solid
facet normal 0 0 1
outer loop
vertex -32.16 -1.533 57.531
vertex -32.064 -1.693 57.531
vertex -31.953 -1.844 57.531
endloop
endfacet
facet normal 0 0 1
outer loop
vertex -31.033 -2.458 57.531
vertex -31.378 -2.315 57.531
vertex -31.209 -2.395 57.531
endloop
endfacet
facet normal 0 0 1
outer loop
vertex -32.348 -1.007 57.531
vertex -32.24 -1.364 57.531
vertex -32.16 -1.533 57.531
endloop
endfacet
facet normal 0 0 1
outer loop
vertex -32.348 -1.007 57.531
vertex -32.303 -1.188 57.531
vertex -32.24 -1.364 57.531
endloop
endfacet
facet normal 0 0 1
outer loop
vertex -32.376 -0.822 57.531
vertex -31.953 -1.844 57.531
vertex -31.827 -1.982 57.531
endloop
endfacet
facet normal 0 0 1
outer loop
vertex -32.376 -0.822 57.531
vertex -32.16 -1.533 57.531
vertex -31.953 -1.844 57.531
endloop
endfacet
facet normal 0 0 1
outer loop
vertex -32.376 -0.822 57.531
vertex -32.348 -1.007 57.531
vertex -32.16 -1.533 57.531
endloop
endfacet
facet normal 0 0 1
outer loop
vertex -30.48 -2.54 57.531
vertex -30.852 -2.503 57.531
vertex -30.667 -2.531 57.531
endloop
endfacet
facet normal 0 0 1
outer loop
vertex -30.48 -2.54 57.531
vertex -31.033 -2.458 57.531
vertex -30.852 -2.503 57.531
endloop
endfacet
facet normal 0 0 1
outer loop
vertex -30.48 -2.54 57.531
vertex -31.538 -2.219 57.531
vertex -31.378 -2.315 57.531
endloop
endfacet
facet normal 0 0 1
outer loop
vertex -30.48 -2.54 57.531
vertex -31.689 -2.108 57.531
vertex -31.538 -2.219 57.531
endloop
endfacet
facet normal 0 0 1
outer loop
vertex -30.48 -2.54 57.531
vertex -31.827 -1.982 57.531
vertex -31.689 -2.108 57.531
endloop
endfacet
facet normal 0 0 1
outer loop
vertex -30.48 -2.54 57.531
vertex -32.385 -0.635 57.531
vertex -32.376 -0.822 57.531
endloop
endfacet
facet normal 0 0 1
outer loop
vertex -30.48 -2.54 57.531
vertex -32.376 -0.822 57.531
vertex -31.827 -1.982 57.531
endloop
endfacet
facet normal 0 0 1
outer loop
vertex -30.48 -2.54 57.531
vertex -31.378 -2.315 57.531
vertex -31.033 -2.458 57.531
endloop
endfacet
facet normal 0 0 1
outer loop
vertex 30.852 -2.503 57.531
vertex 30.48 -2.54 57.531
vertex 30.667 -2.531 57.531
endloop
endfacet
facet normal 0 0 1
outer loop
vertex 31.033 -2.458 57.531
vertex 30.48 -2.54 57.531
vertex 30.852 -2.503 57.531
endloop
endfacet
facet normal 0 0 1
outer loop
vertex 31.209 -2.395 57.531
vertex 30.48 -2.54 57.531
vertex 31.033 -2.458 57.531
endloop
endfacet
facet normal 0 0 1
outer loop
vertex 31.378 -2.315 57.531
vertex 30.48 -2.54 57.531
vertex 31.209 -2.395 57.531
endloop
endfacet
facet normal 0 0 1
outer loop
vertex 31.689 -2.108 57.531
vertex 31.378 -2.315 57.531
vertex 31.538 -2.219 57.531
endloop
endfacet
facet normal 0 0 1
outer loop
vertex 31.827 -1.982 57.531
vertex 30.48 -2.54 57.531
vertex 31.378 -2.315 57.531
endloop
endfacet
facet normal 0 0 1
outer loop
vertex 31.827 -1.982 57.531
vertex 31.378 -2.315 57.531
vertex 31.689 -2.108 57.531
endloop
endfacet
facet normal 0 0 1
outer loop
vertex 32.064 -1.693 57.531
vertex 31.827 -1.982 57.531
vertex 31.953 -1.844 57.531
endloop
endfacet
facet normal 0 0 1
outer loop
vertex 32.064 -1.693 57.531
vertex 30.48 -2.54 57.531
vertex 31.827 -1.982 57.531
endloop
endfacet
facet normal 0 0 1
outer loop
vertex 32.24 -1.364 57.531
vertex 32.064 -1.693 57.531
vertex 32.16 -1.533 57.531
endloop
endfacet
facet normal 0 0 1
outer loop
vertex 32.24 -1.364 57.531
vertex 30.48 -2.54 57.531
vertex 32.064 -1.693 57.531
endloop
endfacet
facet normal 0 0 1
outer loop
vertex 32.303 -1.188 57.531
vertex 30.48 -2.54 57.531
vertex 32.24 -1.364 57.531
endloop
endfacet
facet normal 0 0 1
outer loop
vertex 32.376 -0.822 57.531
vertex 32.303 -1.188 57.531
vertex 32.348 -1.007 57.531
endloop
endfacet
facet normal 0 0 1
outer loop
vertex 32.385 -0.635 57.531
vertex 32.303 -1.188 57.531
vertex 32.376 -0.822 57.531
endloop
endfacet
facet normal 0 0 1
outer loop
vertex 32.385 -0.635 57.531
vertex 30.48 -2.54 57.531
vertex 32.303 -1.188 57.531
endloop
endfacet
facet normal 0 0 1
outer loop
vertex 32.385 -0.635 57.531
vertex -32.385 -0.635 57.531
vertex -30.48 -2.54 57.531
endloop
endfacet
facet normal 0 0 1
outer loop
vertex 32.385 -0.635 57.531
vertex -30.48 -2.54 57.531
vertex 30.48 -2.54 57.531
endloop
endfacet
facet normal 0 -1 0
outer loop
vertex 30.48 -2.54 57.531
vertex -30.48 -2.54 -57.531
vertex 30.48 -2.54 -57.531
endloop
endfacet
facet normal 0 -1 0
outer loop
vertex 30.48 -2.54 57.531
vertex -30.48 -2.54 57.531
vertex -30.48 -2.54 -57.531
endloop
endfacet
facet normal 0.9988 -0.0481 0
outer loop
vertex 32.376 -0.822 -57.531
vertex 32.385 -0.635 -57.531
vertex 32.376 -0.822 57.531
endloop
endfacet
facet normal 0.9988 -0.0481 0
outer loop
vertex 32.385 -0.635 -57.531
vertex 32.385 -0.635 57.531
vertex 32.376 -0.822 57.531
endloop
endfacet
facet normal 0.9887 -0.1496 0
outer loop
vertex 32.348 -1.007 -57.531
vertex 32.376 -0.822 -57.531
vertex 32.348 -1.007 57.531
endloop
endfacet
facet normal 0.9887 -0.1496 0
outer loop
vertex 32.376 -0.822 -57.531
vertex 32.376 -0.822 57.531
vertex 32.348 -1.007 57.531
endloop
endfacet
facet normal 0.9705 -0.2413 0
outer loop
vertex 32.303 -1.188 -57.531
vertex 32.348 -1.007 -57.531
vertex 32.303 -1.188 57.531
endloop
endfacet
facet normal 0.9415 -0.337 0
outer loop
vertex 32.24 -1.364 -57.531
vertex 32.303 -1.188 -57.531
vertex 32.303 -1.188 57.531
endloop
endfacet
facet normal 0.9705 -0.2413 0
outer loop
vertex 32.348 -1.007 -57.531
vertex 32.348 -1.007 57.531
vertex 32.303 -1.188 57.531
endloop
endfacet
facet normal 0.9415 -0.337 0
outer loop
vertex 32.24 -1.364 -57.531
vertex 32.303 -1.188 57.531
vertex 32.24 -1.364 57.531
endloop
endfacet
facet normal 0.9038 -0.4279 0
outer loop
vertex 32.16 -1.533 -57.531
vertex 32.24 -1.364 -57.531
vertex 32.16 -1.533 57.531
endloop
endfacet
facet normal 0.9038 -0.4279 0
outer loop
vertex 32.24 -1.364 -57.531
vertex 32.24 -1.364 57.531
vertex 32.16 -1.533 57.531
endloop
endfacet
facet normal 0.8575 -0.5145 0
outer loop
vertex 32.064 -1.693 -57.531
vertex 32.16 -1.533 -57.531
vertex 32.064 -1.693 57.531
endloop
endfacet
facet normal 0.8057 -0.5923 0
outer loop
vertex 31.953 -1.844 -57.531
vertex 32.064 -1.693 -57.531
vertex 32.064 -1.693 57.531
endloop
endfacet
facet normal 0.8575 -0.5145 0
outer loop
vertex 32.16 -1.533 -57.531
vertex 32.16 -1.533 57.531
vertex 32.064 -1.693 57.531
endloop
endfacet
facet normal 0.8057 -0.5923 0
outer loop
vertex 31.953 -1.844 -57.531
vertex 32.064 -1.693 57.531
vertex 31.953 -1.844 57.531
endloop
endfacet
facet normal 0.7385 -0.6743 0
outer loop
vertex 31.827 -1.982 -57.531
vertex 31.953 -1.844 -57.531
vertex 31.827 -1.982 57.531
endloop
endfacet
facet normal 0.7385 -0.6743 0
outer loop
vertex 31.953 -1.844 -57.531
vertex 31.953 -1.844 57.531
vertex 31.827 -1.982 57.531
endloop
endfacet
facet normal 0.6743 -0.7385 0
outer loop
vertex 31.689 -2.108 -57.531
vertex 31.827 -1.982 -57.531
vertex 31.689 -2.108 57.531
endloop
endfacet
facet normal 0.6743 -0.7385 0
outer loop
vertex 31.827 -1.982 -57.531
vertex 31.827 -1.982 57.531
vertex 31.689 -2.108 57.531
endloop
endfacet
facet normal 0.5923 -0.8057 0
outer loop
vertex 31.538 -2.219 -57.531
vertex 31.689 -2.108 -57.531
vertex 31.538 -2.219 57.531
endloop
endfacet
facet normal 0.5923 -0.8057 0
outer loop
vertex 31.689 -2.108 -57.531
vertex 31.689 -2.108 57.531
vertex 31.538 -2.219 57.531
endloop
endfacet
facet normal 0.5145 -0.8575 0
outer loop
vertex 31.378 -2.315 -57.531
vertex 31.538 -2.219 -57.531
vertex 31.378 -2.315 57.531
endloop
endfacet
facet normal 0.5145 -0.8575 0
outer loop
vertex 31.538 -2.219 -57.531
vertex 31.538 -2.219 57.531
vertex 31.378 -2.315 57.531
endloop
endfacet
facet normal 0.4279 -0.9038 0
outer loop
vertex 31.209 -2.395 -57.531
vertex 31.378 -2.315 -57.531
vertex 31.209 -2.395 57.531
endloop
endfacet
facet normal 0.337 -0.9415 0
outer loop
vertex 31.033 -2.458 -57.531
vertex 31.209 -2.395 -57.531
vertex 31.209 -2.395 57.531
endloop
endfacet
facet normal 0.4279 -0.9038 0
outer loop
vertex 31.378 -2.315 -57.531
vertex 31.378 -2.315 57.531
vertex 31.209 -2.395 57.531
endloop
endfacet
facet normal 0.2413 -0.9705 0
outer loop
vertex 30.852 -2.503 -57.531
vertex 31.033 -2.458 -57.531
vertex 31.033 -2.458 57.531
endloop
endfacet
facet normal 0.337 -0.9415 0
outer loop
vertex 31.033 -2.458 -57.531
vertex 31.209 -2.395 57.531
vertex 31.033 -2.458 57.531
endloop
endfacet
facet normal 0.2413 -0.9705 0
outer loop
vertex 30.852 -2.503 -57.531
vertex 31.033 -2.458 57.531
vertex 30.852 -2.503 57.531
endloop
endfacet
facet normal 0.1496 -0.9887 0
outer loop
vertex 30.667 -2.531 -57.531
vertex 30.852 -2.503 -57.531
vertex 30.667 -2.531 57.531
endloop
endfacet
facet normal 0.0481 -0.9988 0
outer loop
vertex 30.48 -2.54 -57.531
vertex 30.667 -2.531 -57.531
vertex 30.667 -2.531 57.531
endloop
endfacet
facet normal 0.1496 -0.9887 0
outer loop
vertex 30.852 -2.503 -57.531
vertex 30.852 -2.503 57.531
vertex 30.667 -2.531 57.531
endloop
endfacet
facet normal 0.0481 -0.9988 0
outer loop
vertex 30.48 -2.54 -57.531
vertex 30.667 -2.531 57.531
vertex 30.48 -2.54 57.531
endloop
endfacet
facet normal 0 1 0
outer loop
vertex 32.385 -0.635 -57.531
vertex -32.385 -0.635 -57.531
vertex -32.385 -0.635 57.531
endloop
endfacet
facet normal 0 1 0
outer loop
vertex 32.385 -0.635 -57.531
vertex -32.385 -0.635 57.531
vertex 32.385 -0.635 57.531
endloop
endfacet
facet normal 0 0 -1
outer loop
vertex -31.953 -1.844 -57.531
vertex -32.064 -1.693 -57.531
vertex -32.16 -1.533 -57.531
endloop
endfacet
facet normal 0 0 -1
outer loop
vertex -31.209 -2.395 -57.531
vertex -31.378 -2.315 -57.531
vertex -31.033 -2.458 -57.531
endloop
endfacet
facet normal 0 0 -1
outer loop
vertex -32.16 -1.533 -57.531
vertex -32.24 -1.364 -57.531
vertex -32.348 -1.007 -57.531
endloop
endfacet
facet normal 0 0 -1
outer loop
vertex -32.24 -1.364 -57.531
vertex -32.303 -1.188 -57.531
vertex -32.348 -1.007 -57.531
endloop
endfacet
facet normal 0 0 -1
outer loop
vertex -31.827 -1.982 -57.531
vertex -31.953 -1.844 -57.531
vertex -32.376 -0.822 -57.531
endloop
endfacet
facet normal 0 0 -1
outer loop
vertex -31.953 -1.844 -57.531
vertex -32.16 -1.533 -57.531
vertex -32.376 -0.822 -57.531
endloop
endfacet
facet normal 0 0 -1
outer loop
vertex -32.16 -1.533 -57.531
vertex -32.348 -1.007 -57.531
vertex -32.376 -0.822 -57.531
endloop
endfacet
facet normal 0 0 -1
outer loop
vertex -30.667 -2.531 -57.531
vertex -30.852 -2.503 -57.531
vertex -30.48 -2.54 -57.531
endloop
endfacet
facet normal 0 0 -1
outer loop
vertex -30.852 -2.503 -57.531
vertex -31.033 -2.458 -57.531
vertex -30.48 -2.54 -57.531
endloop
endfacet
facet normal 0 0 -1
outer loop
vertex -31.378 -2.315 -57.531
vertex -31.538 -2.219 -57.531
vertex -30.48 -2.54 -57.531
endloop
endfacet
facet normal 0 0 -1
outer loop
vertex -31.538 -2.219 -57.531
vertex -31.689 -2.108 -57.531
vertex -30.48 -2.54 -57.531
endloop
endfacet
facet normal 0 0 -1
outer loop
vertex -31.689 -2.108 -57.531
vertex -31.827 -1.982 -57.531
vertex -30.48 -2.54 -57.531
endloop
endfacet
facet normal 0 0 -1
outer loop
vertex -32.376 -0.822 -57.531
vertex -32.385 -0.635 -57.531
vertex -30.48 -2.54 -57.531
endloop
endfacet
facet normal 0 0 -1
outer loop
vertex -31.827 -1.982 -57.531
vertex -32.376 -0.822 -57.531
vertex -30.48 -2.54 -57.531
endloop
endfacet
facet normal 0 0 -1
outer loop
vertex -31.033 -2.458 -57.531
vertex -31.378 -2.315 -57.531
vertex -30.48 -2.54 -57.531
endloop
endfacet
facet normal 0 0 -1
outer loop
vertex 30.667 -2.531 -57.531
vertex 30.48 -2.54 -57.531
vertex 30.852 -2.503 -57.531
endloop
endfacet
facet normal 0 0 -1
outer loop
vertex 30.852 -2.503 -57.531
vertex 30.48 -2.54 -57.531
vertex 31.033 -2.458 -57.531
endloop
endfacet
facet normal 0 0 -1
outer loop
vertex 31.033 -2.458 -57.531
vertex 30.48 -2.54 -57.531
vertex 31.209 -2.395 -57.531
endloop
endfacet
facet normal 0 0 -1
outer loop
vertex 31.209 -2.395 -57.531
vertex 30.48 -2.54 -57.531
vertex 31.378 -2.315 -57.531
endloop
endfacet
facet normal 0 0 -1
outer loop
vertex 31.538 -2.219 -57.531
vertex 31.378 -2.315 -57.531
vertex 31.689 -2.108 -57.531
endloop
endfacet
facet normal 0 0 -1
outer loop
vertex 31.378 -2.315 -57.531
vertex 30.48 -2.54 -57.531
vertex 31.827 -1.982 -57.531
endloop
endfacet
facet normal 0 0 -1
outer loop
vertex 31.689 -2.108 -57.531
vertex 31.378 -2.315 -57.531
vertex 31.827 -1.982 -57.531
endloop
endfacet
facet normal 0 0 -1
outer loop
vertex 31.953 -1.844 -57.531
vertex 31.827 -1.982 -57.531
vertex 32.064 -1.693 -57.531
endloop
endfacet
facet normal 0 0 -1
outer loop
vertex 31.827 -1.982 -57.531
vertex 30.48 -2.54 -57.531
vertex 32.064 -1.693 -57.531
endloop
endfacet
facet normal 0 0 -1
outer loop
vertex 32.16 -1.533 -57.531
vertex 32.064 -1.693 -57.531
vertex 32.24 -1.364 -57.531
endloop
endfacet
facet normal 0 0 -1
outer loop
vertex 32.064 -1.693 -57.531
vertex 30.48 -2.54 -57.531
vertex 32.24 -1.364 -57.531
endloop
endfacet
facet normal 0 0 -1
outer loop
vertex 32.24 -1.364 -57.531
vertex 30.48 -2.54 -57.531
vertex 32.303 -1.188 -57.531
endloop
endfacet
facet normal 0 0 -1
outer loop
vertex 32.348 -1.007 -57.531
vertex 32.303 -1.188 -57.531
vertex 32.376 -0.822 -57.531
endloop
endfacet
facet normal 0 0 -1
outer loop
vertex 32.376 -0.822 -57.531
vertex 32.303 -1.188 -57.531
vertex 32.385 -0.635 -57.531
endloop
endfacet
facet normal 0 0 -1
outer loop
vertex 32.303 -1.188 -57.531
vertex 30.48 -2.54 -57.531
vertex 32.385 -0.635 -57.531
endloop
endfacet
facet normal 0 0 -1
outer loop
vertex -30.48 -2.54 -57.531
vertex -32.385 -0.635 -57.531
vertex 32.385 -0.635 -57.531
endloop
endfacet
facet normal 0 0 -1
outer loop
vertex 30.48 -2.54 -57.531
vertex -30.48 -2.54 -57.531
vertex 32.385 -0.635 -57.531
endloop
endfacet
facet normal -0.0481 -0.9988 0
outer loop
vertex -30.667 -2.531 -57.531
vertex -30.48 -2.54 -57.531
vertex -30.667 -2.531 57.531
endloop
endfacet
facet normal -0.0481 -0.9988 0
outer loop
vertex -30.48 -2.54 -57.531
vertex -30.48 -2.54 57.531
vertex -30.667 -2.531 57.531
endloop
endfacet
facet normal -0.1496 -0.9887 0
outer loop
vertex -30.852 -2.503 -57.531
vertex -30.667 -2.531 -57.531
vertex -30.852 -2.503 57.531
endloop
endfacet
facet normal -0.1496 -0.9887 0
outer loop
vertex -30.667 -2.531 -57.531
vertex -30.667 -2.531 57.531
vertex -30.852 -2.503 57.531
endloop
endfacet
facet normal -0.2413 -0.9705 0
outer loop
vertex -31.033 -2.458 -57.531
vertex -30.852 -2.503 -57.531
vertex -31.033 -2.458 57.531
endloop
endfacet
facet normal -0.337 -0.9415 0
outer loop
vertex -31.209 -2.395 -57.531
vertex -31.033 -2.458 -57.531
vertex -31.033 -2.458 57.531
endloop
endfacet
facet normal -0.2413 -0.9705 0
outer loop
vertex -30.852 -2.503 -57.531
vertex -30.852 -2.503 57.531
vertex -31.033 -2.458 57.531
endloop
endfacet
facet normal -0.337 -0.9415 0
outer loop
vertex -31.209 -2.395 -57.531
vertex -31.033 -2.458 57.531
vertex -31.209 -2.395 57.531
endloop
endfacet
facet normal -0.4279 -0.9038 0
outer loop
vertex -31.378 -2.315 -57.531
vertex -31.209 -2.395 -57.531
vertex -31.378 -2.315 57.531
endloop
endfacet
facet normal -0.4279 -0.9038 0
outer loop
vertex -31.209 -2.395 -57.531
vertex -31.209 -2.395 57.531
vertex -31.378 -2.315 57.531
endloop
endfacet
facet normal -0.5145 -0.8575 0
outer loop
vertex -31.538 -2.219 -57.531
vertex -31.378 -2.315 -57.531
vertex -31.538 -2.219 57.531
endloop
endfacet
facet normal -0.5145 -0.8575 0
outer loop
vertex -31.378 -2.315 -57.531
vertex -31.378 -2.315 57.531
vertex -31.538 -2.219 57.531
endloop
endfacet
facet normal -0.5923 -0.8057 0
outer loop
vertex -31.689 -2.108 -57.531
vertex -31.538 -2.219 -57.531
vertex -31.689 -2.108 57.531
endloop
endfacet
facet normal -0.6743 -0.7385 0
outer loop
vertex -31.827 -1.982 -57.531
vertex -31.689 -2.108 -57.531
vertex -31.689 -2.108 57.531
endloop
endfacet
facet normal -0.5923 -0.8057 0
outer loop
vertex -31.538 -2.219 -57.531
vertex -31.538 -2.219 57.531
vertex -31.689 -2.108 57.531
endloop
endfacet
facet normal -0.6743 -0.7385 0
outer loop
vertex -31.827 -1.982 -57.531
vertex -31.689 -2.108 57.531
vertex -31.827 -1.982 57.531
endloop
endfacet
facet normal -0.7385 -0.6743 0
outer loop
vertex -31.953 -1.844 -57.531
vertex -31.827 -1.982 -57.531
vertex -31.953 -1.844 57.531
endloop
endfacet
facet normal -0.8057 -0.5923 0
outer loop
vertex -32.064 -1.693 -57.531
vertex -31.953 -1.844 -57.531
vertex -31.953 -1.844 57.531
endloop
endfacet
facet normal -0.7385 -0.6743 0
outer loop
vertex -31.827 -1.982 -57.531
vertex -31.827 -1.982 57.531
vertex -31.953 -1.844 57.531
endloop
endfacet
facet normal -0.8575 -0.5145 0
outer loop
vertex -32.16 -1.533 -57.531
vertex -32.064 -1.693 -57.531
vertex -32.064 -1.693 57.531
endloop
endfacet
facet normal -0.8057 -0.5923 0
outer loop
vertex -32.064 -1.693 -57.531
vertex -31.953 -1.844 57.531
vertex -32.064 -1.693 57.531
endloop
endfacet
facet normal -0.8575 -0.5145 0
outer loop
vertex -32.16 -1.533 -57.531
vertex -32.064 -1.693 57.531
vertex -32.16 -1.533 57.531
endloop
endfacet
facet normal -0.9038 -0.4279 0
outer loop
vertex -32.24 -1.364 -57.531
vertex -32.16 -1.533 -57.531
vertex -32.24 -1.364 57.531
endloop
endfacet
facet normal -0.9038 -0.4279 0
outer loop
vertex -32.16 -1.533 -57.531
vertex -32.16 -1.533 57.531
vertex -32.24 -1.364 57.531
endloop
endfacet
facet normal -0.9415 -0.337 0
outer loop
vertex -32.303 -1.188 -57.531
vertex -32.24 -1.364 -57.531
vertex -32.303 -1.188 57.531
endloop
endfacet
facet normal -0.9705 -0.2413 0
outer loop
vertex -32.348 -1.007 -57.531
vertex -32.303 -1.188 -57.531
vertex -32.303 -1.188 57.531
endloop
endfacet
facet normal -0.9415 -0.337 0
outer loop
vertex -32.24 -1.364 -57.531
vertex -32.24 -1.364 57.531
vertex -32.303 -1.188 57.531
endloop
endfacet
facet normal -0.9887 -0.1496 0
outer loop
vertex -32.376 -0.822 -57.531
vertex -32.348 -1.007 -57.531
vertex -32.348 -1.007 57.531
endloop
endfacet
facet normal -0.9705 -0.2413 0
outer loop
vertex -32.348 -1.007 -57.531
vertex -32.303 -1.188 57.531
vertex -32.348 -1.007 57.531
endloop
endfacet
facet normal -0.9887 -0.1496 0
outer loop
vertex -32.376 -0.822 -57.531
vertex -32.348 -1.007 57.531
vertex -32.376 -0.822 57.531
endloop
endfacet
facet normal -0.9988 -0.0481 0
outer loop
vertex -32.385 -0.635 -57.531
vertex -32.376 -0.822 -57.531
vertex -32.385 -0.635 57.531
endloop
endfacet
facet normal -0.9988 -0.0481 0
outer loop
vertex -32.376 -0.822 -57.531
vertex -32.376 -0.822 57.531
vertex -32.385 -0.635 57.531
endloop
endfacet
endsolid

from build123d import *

# Parameters (mm, degrees)
F0_W      = 64.77
F0_H      = 115.062
F1_DEPTH  = 2.54
F2_R      = 1.905
F3_R      = 1.905
F1_FACE_W = 64.77
F1_FACE_H = 115.062
F4_DEPTH  = 0.635


with BuildPart() as f1:
    # F0 (on Front) → F1 (new body)
    with BuildSketch(Plane.XZ):
        Rectangle(F0_W, F0_H)
    extrude(amount=F1_DEPTH)

    # F2
    f2_edges = [f1.edges().sort_by_distance(p)[0] for p in [
        (32.385, -2.54, 0),
    ]]
    fillet(f2_edges, radius=F2_R)

    # F3
    f3_edges = [f1.edges().sort_by_distance(p)[0] for p in [
        (-32.385, -2.54, 0),
    ]]
    fillet(f3_edges, radius=F3_R)

    # F1_face (on face) → F4 (cut)
    with BuildSketch(Plane(origin=(0, 0, 0), x_dir=(1, 0, 0), z_dir=(0, 1, 0))):
        Rectangle(F1_FACE_W, F1_FACE_H)
    extrude(amount=-F4_DEPTH, mode=Mode.SUBTRACT)


solid = f1.part
